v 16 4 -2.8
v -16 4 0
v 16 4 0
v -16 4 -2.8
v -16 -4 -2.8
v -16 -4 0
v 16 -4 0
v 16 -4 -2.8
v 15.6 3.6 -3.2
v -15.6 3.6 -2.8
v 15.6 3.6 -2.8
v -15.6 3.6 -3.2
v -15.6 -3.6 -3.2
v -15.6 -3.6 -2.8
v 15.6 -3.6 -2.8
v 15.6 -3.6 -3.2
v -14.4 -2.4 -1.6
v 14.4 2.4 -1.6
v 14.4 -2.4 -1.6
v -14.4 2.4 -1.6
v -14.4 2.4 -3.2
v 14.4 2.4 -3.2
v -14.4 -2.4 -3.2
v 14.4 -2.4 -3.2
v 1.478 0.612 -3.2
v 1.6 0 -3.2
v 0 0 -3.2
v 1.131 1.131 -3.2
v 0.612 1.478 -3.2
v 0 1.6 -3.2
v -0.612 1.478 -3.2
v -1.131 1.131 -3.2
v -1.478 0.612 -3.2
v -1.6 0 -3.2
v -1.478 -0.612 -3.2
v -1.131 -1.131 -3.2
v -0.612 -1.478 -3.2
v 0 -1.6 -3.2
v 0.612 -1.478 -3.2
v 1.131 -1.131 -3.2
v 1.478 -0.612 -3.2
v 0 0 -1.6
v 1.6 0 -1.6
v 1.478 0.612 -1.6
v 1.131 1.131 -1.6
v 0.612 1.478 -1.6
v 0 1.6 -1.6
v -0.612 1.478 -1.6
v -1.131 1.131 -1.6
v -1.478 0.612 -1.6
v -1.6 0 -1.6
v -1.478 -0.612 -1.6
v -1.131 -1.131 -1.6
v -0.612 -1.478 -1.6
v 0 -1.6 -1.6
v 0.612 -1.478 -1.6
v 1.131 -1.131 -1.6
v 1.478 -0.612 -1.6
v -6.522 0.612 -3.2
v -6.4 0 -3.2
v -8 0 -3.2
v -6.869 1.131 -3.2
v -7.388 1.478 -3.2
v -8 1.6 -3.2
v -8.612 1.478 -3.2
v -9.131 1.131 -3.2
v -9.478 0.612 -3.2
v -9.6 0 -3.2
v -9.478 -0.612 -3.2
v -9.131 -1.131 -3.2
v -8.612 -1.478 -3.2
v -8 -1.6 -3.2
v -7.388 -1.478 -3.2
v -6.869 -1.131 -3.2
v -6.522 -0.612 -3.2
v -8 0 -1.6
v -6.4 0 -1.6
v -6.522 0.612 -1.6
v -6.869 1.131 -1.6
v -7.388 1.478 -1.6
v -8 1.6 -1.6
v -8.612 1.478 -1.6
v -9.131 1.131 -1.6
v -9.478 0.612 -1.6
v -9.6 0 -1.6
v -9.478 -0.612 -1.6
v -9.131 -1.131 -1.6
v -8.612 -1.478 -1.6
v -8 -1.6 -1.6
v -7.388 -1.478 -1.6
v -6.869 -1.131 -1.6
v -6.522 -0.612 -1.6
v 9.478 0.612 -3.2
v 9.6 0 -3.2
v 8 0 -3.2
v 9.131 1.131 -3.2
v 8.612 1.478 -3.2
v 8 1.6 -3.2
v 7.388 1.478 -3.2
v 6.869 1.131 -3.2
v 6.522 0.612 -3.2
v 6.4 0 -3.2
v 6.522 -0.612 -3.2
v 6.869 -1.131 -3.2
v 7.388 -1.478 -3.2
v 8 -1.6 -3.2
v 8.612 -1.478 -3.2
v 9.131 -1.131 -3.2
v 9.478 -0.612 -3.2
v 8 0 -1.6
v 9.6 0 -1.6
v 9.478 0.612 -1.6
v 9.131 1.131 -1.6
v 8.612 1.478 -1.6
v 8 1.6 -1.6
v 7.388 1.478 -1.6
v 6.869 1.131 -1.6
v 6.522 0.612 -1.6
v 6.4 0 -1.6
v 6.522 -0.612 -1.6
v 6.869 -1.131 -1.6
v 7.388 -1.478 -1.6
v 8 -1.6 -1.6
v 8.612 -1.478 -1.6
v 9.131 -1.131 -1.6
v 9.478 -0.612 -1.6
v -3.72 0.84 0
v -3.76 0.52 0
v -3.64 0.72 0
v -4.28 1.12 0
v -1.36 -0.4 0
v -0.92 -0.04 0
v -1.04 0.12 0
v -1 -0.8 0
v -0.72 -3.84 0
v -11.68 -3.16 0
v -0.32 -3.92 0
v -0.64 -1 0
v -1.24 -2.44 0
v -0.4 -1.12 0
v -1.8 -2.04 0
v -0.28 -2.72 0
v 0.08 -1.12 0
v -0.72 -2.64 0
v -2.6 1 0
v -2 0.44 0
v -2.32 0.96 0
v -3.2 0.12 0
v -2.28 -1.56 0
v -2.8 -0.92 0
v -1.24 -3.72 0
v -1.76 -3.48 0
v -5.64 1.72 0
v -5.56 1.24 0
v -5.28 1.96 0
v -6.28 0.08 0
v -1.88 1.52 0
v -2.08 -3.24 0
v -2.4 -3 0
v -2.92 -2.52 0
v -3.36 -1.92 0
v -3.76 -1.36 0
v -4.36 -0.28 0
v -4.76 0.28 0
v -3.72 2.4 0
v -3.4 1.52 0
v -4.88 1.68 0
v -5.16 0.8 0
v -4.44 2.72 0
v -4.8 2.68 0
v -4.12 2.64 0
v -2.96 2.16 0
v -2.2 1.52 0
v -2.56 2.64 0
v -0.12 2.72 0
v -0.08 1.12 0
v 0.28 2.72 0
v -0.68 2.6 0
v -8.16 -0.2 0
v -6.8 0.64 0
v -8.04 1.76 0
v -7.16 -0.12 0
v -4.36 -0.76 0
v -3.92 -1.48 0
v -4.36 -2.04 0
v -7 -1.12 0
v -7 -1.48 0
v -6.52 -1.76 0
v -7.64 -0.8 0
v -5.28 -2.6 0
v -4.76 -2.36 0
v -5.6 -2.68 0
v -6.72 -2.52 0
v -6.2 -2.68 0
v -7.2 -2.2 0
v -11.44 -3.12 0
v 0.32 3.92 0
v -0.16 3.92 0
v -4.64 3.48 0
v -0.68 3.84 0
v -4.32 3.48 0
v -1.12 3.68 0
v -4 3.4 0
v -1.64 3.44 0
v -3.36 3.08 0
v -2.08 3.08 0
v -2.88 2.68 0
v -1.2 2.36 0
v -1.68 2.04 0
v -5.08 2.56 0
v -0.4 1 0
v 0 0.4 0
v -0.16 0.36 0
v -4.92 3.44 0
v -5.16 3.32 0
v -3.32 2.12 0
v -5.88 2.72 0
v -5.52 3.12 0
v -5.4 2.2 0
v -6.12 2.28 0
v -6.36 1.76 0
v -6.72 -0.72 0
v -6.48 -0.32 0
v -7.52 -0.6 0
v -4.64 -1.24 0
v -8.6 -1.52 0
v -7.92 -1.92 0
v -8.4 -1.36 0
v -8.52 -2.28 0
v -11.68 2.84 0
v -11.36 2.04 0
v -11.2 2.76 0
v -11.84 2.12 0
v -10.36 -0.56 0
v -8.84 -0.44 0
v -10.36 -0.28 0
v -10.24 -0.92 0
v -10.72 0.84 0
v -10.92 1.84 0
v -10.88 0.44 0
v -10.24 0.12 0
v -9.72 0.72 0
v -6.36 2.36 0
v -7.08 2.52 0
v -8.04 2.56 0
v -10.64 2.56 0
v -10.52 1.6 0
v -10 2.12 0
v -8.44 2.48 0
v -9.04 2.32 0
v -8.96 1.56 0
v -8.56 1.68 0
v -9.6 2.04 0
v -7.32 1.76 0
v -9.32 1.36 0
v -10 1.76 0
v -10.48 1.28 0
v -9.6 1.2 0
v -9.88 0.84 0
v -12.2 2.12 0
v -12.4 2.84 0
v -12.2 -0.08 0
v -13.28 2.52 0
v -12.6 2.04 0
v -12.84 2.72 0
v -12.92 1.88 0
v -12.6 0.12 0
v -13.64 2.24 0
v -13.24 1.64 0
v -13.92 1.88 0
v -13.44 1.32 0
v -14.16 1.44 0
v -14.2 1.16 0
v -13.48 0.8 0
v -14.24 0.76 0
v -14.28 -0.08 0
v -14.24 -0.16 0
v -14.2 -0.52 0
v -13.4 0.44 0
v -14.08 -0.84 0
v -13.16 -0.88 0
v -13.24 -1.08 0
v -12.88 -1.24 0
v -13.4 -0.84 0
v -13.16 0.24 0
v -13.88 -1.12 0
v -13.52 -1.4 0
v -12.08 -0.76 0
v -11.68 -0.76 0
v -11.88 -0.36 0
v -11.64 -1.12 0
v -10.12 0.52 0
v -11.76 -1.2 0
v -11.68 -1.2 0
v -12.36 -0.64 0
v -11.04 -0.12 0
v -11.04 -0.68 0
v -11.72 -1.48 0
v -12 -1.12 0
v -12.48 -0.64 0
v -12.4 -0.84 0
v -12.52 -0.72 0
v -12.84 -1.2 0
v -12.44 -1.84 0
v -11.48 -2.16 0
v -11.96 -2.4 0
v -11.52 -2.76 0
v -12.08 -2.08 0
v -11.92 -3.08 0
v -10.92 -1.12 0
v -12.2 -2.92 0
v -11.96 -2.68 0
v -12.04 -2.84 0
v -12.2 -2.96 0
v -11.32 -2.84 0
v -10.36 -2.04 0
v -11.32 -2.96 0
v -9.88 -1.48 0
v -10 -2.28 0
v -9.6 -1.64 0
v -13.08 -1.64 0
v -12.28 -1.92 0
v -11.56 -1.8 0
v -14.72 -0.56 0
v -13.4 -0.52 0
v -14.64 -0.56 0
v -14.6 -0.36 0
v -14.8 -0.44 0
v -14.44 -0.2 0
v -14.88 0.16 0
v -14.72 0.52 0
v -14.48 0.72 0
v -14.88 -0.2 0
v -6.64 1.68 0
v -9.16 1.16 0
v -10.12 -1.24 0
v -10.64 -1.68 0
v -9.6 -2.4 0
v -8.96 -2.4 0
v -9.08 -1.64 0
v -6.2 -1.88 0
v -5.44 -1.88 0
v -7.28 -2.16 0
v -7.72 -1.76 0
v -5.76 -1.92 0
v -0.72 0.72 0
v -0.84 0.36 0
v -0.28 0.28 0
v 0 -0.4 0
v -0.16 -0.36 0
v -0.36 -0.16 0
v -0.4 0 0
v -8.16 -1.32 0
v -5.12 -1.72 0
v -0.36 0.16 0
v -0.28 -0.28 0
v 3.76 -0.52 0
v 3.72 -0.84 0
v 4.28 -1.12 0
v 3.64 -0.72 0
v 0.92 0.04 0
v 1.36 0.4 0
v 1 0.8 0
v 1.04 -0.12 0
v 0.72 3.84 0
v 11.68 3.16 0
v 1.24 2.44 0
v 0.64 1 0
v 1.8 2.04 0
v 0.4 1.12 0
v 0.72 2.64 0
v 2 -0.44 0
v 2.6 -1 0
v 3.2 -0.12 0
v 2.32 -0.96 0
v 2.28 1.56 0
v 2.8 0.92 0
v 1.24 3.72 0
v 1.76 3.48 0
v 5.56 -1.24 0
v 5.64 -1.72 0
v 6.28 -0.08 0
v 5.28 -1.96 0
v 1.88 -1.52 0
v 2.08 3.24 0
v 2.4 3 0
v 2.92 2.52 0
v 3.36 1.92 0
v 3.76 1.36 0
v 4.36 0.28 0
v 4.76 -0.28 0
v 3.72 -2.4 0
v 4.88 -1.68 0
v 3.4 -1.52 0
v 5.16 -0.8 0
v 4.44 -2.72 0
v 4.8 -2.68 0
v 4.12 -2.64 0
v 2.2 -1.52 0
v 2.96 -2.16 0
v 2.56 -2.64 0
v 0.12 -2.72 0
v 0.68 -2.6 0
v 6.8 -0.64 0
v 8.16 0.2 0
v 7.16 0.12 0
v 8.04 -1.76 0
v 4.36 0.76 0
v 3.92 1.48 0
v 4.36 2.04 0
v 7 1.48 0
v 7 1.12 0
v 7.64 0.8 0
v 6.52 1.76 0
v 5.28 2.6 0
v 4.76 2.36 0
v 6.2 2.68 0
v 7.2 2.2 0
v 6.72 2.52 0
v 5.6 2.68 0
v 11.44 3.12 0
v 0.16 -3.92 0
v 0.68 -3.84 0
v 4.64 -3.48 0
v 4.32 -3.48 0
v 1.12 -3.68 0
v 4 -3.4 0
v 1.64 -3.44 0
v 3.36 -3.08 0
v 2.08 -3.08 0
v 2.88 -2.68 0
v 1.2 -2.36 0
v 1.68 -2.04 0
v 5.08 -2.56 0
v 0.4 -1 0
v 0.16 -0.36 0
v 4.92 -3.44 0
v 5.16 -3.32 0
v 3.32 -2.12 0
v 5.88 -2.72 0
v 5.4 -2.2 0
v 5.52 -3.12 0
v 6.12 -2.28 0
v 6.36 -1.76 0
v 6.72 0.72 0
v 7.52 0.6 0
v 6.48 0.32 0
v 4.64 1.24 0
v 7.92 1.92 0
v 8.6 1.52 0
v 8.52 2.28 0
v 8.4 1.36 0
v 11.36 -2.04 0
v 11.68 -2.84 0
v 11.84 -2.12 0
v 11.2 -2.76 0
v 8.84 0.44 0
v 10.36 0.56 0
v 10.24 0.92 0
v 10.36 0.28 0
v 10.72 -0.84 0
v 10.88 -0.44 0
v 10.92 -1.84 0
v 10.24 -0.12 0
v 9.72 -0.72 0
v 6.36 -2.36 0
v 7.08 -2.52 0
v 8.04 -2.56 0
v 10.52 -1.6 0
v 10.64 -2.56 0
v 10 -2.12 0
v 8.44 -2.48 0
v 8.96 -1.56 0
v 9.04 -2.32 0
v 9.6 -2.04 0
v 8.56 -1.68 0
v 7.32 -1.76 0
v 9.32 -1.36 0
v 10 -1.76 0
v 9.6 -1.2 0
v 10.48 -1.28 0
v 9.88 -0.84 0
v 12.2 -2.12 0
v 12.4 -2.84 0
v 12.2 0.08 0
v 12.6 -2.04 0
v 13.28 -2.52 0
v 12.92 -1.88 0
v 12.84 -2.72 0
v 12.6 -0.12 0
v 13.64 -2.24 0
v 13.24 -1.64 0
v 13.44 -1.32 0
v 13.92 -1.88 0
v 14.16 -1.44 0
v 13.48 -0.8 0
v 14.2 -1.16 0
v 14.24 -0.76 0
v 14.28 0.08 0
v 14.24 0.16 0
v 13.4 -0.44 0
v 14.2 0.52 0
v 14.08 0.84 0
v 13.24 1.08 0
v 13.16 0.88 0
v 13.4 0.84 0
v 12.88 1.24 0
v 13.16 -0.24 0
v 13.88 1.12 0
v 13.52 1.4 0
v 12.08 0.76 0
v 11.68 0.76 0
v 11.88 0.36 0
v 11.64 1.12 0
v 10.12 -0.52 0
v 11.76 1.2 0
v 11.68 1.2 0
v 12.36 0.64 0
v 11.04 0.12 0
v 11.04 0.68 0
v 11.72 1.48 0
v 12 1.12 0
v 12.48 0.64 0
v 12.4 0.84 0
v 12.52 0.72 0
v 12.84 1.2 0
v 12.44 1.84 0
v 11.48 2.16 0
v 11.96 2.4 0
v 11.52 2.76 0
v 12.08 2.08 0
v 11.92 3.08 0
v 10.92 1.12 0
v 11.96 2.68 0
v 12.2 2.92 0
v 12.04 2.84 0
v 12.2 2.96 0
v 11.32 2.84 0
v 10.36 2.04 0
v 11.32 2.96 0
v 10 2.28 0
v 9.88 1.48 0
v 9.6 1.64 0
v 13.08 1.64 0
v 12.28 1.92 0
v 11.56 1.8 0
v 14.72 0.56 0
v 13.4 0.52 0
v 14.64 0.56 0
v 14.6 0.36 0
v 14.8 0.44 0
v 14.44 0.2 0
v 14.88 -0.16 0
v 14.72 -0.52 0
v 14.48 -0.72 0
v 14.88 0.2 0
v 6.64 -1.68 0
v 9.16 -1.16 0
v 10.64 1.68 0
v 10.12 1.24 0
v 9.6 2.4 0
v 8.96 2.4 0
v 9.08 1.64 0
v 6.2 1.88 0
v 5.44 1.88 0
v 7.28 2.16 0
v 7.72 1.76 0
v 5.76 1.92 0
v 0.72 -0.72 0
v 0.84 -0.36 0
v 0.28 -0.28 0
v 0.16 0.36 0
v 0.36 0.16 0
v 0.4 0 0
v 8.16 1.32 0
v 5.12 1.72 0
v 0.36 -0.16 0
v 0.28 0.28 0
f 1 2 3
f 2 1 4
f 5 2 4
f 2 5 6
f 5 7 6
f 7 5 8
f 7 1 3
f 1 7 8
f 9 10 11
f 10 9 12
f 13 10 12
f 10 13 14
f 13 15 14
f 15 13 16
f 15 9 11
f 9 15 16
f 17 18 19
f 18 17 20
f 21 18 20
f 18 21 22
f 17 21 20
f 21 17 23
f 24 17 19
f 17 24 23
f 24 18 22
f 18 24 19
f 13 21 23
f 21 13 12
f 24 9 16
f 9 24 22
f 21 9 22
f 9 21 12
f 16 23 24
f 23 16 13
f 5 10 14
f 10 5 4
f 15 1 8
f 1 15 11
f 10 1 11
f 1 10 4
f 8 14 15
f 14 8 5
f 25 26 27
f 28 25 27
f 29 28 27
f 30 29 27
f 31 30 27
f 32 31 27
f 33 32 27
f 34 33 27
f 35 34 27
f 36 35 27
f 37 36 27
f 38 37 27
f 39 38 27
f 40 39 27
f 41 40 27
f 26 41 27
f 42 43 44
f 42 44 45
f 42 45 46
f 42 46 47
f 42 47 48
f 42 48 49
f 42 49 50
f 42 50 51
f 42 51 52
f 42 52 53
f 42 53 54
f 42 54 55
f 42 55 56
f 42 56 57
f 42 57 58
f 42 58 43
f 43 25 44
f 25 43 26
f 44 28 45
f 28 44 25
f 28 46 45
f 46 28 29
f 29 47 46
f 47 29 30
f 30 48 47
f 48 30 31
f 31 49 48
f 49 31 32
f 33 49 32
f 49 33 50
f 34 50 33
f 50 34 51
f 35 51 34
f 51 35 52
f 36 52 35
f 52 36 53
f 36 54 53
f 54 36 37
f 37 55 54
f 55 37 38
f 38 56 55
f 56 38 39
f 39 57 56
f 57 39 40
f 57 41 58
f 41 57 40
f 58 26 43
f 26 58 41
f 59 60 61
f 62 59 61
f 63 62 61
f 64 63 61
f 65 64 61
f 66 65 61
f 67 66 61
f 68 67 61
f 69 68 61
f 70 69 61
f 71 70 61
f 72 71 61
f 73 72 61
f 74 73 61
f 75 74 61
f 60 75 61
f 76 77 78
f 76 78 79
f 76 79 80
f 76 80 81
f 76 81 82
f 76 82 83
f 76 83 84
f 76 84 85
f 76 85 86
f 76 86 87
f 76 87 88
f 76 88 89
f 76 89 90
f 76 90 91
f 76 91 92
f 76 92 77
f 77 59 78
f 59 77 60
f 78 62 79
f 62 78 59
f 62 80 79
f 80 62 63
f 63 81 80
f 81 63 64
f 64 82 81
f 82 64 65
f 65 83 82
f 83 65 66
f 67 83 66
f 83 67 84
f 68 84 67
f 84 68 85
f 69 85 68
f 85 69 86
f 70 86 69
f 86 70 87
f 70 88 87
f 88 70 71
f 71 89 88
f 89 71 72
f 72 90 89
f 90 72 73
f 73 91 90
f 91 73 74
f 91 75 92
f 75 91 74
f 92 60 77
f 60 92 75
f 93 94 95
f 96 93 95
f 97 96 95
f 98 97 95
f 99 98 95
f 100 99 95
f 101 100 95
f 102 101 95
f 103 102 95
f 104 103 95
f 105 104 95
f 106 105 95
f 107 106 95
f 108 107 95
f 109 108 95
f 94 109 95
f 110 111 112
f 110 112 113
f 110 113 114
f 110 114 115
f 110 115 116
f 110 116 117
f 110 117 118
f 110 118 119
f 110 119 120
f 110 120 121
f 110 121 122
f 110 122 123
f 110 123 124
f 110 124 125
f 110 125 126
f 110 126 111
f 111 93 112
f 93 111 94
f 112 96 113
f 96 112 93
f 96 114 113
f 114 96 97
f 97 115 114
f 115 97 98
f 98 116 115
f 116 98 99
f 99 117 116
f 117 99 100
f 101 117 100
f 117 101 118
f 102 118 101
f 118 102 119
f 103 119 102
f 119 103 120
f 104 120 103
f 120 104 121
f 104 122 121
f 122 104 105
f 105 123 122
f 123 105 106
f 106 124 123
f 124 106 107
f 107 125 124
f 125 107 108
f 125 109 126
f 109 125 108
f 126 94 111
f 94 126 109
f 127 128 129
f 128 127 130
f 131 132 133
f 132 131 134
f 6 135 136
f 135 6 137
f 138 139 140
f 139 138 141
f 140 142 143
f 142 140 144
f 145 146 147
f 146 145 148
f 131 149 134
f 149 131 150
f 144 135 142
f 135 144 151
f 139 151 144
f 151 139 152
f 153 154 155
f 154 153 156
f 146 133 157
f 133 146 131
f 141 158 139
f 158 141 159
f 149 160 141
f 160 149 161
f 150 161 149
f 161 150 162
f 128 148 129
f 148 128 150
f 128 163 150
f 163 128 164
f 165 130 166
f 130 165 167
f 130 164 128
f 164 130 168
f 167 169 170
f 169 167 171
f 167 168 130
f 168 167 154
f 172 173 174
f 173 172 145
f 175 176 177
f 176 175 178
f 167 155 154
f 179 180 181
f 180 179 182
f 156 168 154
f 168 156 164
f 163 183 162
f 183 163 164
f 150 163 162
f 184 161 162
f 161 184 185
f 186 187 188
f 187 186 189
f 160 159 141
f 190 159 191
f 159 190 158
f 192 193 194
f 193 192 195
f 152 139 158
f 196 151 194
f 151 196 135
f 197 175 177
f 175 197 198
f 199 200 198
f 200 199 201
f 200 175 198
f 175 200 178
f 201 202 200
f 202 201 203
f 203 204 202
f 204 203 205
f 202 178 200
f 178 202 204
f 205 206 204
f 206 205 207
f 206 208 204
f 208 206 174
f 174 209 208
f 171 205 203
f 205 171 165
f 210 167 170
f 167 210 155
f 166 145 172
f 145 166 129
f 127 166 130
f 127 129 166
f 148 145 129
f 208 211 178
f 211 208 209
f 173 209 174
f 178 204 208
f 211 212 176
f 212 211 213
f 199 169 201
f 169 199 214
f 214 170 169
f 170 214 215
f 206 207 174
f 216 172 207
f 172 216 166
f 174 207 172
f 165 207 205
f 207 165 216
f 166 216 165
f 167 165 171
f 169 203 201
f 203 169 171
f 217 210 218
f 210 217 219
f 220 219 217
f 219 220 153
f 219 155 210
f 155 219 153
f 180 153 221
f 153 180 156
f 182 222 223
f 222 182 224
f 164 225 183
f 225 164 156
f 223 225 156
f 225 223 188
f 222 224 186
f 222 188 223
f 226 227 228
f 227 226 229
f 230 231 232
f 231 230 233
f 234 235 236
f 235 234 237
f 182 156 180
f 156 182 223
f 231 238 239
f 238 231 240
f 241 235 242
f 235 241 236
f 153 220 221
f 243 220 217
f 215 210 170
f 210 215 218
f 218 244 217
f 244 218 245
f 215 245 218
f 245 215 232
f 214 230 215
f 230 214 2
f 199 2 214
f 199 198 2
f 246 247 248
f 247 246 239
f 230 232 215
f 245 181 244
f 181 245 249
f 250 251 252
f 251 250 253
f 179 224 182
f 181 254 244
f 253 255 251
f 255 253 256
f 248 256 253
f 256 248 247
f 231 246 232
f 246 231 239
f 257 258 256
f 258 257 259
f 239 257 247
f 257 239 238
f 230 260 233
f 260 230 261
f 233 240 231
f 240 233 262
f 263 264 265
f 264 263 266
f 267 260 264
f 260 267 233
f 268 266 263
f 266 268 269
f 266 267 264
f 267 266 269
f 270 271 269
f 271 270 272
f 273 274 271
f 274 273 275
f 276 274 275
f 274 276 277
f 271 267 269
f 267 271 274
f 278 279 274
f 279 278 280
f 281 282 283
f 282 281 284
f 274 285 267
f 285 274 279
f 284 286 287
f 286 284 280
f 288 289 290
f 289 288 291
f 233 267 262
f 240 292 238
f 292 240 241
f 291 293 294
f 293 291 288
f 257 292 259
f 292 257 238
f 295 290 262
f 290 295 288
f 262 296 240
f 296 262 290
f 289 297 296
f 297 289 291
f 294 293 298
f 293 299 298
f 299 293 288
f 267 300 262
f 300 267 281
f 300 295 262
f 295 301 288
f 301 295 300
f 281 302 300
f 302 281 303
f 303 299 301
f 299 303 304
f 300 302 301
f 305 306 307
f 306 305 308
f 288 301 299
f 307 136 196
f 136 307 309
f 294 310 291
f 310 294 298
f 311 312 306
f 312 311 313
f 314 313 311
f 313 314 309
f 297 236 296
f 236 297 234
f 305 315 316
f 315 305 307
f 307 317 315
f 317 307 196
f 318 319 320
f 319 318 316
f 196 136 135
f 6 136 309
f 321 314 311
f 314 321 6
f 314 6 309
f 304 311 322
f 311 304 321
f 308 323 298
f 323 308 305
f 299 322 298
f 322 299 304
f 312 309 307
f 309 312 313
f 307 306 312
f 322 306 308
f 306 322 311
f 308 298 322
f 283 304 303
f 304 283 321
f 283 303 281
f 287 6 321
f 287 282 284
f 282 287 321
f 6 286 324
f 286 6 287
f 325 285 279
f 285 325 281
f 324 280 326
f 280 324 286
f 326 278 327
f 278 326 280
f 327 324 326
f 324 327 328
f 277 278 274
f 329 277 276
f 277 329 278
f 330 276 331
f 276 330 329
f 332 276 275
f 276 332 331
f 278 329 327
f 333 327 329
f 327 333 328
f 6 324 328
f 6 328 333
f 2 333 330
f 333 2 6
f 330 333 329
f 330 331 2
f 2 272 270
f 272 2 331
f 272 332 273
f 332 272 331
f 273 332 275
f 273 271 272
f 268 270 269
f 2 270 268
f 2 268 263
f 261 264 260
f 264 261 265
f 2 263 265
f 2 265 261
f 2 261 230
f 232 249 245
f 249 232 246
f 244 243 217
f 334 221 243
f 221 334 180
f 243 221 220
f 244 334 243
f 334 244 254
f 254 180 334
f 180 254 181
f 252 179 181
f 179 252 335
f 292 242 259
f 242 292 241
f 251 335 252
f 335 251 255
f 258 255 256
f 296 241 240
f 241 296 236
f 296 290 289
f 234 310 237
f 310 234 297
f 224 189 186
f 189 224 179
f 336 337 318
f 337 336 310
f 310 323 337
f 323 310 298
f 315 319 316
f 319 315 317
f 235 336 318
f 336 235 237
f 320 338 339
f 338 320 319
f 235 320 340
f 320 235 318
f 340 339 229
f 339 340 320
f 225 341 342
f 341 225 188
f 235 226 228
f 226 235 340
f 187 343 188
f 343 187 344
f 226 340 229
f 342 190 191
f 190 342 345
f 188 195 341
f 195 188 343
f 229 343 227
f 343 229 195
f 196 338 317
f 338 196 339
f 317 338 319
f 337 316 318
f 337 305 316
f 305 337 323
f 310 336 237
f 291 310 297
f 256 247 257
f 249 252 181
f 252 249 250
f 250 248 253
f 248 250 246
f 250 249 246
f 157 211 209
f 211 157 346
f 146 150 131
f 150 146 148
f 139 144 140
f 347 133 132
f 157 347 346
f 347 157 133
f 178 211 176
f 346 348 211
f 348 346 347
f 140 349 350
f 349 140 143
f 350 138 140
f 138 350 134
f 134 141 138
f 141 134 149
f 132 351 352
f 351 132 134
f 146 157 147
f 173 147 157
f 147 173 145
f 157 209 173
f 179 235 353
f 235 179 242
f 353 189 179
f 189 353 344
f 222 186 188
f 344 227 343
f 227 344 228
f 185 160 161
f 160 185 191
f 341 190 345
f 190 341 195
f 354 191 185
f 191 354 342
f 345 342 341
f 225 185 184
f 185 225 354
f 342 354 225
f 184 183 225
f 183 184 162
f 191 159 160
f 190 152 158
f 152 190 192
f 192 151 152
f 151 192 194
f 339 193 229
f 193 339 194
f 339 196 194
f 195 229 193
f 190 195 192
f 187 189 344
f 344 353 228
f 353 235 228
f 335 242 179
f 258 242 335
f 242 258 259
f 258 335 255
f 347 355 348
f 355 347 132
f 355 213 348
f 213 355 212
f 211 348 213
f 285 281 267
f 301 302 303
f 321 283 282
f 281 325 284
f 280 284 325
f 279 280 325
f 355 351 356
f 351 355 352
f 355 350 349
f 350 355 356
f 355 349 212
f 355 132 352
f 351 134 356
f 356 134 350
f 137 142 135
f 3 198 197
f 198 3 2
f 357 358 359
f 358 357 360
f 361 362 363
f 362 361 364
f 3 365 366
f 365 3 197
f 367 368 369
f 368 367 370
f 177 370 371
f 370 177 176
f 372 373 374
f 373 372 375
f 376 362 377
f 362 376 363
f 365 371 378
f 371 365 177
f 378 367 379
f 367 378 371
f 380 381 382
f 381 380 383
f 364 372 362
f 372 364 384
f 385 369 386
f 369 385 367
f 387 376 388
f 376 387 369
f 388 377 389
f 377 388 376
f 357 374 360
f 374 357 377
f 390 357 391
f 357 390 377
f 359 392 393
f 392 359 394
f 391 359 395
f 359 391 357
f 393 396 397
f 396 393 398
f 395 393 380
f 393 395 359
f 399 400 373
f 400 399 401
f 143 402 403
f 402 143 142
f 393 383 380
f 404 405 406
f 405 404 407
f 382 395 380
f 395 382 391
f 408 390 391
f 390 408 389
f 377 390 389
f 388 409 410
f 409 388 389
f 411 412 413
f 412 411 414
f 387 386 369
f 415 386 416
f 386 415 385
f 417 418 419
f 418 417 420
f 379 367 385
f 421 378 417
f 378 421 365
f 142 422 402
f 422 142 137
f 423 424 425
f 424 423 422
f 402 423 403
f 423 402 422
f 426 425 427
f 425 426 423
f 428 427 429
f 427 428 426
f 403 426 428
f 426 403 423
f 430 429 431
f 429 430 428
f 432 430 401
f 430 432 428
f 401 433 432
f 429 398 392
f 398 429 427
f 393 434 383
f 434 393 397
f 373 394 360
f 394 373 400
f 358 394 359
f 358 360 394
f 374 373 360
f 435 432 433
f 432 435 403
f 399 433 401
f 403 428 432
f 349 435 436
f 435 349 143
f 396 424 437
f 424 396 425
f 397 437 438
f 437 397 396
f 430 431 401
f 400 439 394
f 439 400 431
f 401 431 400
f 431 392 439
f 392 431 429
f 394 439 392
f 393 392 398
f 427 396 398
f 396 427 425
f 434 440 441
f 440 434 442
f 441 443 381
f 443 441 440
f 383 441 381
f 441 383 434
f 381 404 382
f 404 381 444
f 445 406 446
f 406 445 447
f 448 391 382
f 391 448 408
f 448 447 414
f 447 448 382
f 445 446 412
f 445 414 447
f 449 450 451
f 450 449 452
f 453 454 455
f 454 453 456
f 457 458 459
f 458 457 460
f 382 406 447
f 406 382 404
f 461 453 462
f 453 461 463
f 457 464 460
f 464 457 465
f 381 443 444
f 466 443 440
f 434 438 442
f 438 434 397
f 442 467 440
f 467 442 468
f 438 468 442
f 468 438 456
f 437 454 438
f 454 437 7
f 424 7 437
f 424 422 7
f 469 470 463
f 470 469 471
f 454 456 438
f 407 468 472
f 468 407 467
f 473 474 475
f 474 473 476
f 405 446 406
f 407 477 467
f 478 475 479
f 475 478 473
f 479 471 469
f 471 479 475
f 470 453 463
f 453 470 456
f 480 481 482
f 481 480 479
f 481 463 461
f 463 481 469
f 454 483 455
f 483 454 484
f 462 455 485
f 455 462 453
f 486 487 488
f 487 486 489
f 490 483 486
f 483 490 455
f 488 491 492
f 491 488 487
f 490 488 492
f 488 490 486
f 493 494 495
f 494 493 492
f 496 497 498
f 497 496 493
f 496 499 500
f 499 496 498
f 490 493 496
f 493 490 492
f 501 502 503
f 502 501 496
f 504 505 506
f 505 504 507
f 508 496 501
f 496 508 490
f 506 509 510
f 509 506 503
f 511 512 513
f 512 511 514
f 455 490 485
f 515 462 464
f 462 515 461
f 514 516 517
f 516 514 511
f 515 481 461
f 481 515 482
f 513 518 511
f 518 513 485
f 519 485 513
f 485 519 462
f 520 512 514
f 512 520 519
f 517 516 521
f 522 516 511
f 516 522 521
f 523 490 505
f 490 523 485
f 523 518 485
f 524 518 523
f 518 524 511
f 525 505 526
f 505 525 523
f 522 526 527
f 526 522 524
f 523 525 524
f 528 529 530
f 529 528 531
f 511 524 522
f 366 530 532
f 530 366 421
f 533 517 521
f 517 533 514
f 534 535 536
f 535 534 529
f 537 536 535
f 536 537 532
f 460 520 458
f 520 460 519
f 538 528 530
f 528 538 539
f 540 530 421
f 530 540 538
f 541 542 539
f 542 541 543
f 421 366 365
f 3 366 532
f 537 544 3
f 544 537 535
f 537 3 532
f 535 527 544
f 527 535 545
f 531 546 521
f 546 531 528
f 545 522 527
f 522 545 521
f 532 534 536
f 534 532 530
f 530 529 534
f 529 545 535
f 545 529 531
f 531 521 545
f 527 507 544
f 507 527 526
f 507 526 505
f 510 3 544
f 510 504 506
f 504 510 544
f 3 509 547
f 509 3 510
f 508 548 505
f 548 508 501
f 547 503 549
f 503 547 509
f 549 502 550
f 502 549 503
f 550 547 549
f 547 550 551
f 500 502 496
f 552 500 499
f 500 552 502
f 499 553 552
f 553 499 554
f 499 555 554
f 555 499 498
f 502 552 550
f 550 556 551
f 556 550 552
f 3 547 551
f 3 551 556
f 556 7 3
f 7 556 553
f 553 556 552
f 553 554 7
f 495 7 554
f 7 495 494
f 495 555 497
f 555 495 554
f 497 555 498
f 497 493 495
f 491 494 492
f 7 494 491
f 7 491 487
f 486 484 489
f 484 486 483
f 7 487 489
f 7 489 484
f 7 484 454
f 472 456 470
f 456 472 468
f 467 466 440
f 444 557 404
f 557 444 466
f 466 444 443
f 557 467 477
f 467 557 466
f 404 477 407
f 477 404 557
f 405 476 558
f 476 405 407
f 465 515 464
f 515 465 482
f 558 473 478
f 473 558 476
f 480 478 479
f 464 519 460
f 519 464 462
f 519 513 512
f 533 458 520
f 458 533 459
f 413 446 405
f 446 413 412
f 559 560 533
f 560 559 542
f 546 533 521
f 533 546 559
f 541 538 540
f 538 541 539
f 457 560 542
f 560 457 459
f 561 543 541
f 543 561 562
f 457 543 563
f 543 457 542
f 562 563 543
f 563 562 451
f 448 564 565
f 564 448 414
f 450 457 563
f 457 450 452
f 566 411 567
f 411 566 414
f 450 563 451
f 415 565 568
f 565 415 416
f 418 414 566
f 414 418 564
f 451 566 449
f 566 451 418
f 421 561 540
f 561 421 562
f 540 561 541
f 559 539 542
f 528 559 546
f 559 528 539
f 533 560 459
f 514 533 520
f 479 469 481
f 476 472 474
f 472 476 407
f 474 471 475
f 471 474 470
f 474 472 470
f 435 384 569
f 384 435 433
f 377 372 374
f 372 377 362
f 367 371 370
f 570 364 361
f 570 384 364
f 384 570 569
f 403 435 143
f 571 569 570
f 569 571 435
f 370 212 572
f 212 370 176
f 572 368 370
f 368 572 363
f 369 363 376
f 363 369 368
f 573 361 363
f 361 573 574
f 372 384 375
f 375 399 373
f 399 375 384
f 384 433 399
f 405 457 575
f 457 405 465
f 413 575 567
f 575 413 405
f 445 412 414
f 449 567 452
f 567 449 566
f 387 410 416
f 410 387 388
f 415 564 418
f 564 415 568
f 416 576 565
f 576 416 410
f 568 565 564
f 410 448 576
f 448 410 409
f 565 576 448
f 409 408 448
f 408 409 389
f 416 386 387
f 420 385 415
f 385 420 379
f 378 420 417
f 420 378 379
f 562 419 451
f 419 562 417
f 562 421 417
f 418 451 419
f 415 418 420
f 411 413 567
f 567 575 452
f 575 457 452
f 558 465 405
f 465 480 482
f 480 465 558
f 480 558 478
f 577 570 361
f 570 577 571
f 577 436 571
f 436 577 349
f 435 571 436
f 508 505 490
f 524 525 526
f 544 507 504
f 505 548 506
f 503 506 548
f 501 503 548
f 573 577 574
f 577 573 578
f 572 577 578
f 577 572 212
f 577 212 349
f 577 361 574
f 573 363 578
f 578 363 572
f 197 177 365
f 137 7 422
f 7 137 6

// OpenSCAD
// file: ../p/4-4edge.scad
use <../lib.scad>
function ldraw_lib__4_4edge() = [
// 0 Circle 1.0
// 0 Name: 4-4edge.dat
// 0 Author: James Jessiman
// 0 !LDRAW_ORG Primitive UPDATE 2017-01
// 0 !LICENSE Licensed under CC BY 2.0 and CC BY 4.0 : see CAreadme.txt
// 
// 0 BFC CERTIFY CCW
  [0,"BFC","CERTIFY"],
  [0,"BFC","CCW"],
// 
// 0 !HISTORY 1998-12-15 [PTadmin] Official Update 1998-10
// 0 !HISTORY 2005-12-28 [PTadmin] Official Update 2005-01
// 0 !HISTORY 2007-06-24 [PTadmin] Header formatted for Contributor Agreement
// 0 !HISTORY 2008-07-01 [PTadmin] Official Update 2008-01
// 0 !HISTORY 2017-01-15 [Steffen] BFCed
// 0 !HISTORY 2017-12-30 [PTadmin] Official Update 2017-01
// 
// 
// 2 24 1 0 0 0.9239 0 0.3827
  [2,24,1,0,0,0.9239,0,0.3827],
// 2 24 0.9239 0 0.3827 0.7071 0 0.7071
  [2,24,0.9239,0,0.3827,0.7071,0,0.7071],
// 2 24 0.7071 0 0.7071 0.3827 0 0.9239
  [2,24,0.7071,0,0.7071,0.3827,0,0.9239],
// 2 24 0.3827 0 0.9239 0 0 1
  [2,24,0.3827,0,0.9239,0,0,1],
// 2 24 0 0 1 -0.3827 0 0.9239
  [2,24,0,0,1,-0.3827,0,0.9239],
// 2 24 -0.3827 0 0.9239 -0.7071 0 0.7071
  [2,24,-0.3827,0,0.9239,-0.7071,0,0.7071],
// 2 24 -0.7071 0 0.7071 -0.9239 0 0.3827
  [2,24,-0.7071,0,0.7071,-0.9239,0,0.3827],
// 2 24 -0.9239 0 0.3827 -1 0 -0
  [2,24,-0.9239,0,0.3827,-1,0,-0],
// 2 24 -1 0 -0 -0.9239 0 -0.3827
  [2,24,-1,0,-0,-0.9239,0,-0.3827],
// 2 24 -0.9239 0 -0.3827 -0.7071 0 -0.7071
  [2,24,-0.9239,0,-0.3827,-0.7071,0,-0.7071],
// 2 24 -0.7071 0 -0.7071 -0.3827 0 -0.9239
  [2,24,-0.7071,0,-0.7071,-0.3827,0,-0.9239],
// 2 24 -0.3827 0 -0.9239 0 0 -1
  [2,24,-0.3827,0,-0.9239,0,0,-1],
// 2 24 0 0 -1 0.3827 0 -0.9239
  [2,24,0,0,-1,0.3827,0,-0.9239],
// 2 24 0.3827 0 -0.9239 0.7071 0 -0.7071
  [2,24,0.3827,0,-0.9239,0.7071,0,-0.7071],
// 2 24 0.7071 0 -0.7071 0.9239 0 -0.3827
  [2,24,0.7071,0,-0.7071,0.9239,0,-0.3827],
// 2 24 0.9239 0 -0.3827 1 0 0
  [2,24,0.9239,0,-0.3827,1,0,0],
];
module ldraw_lib__4_4edge(step=0, col=false, unit=2/5, alt=false, line=0.2, solid=!$preview)
    makepoly(ldraw_lib__4_4edge(), step=step, col=col, unit=unit, alt=alt, line=line, solid=solid);
ldraw_lib__4_4edge(line=0.2);
// file: ../p/4-4disc.scad
use <../lib.scad>
function ldraw_lib__4_4disc() = [
// 0 Disc 1.0
// 0 Name: 4-4disc.dat
// 0 Author: James Jessiman
// 0 !LDRAW_ORG Primitive UPDATE 2002-02
// 0 !LICENSE Licensed under CC BY 2.0 and CC BY 4.0 : see CAreadme.txt
// 
// 0 BFC CERTIFY CCW
  [0,"BFC","CERTIFY"],
  [0,"BFC","CCW"],
// 
// 0 !HISTORY 1998-12-15 [PTadmin] Official Update 1998-10
// 0 !HISTORY 2002-03-23 [sbliss] Added BFC statement
// 0 !HISTORY 2002-04-25 [PTadmin] Official Update 2002-02
// 0 !HISTORY 2007-06-24 [PTadmin] Header formatted for Contributor Agreement
// 0 !HISTORY 2008-07-01 [PTadmin] Official Update 2008-01
// 
// 
// 3 16 0 0 0 1 0 0 0.9239 0 0.3827
  [3,16,0,0,0,1,0,0,0.9239,0,0.3827],
// 3 16 0 0 0 0.9239 0 0.3827 0.7071 0 0.7071
  [3,16,0,0,0,0.9239,0,0.3827,0.7071,0,0.7071],
// 3 16 0 0 0 0.7071 0 0.7071 0.3827 0 0.9239
  [3,16,0,0,0,0.7071,0,0.7071,0.3827,0,0.9239],
// 3 16 0 0 0 0.3827 0 0.9239 0 0 1
  [3,16,0,0,0,0.3827,0,0.9239,0,0,1],
// 3 16 0 0 0 0 0 1 -0.3827 0 0.9239
  [3,16,0,0,0,0,0,1,-0.3827,0,0.9239],
// 3 16 0 0 0 -0.3827 0 0.9239 -0.7071 0 0.7071
  [3,16,0,0,0,-0.3827,0,0.9239,-0.7071,0,0.7071],
// 3 16 0 0 0 -0.7071 0 0.7071 -0.9239 0 0.3827
  [3,16,0,0,0,-0.7071,0,0.7071,-0.9239,0,0.3827],
// 3 16 0 0 0 -0.9239 0 0.3827 -1 0 -0
  [3,16,0,0,0,-0.9239,0,0.3827,-1,0,-0],
// 3 16 0 0 0 -1 0 -0 -0.9239 0 -0.3827
  [3,16,0,0,0,-1,0,-0,-0.9239,0,-0.3827],
// 3 16 0 0 0 -0.9239 0 -0.3827 -0.7071 0 -0.7071
  [3,16,0,0,0,-0.9239,0,-0.3827,-0.7071,0,-0.7071],
// 3 16 0 0 0 -0.7071 0 -0.7071 -0.3827 0 -0.9239
  [3,16,0,0,0,-0.7071,0,-0.7071,-0.3827,0,-0.9239],
// 3 16 0 0 0 -0.3827 0 -0.9239 0 0 -1
  [3,16,0,0,0,-0.3827,0,-0.9239,0,0,-1],
// 3 16 0 0 0 0 0 -1 0.3827 0 -0.9239
  [3,16,0,0,0,0,0,-1,0.3827,0,-0.9239],
// 3 16 0 0 0 0.3827 0 -0.9239 0.7071 0 -0.7071
  [3,16,0,0,0,0.3827,0,-0.9239,0.7071,0,-0.7071],
// 3 16 0 0 0 0.7071 0 -0.7071 0.9239 0 -0.3827
  [3,16,0,0,0,0.7071,0,-0.7071,0.9239,0,-0.3827],
// 3 16 0 0 0 0.9239 0 -0.3827 1 0 0
  [3,16,0,0,0,0.9239,0,-0.3827,1,0,0],
// 0
];
module ldraw_lib__4_4disc(step=0, col=false, unit=2/5, alt=false, line=0.2, solid=!$preview)
    makepoly(ldraw_lib__4_4disc(), step=step, col=col, unit=unit, alt=alt, line=line, solid=solid);
ldraw_lib__4_4disc(line=0.2);
// file: ../p/4-4cyli.scad
use <../lib.scad>
$fa=1; $fs=0.2;
function ldraw_lib__4_4cyli(realsolid=false) = [
// 0 Cylinder 1.0
// 0 Name: 4-4cyli.dat
// 0 Author: James Jessiman
// 0 !LDRAW_ORG Primitive UPDATE 2005-01
// 0 !LICENSE Licensed under CC BY 2.0 and CC BY 4.0 : see CAreadme.txt
// 
// 0 BFC CERTIFY CCW
  [0,"BFC","CERTIFY"],
  [0,"BFC","CCW"],
// 
// 0 !HISTORY 1998-12-15 [PTadmin] Official Update 1998-10
// 0 !HISTORY 2002-03-23 [sbliss] Added BFC statement; merged headers from files in distributions LDraw 0.27 and Complete.
// 0 !HISTORY 2002-04-25 [PTadmin] Official Update 2002-02
// 0 !HISTORY 2004-12-14 [guyvivan] BFC CCW
// 0 !HISTORY 2005-12-28 [PTadmin] Official Update 2005-01
// 0 !HISTORY 2007-06-24 [PTadmin] Header formatted for Contributor Agreement
// 0 !HISTORY 2008-07-01 [PTadmin] Official Update 2008-01
// 
// 
// 4 16 1 1 0 0.9239 1 0.3827 0.9239 0 0.3827 1 0 0
  [4,16,1,1,0,0.9239,1,0.3827,0.9239,0,0.3827,1,0,0],
// 5 24 1 0 0 1 1 0 0.9239 0 0.3827 0.9239 0 -0.3827
  [5,24,1,0,0,1,1,0,0.9239,0,0.3827,0.9239,0,-0.3827],
// 4 16 0.9239 1 0.3827 0.7071 1 0.7071 0.7071 0 0.7071 0.9239 0 0.3827
  [4,16,0.9239,1,0.3827,0.7071,1,0.7071,0.7071,0,0.7071,0.9239,0,0.3827],
// 5 24 0.9239 0 0.3827 0.9239 1 0.3827 0.7071 0 0.7071 1 0 0
  [5,24,0.9239,0,0.3827,0.9239,1,0.3827,0.7071,0,0.7071,1,0,0],
// 4 16 0.7071 1 0.7071 0.3827 1 0.9239 0.3827 0 0.9239 0.7071 0 0.7071
  [4,16,0.7071,1,0.7071,0.3827,1,0.9239,0.3827,0,0.9239,0.7071,0,0.7071],
// 5 24 0.7071 0 0.7071 0.7071 1 0.7071 0.3827 0 0.9239 0.9239 0 0.3827
  [5,24,0.7071,0,0.7071,0.7071,1,0.7071,0.3827,0,0.9239,0.9239,0,0.3827],
// 4 16 0.3827 1 0.9239 0 1 1 0 0 1 0.3827 0 0.9239
  [4,16,0.3827,1,0.9239,0,1,1,0,0,1,0.3827,0,0.9239],
// 5 24 0.3827 0 0.9239 0.3827 1 0.9239 0 0 1 0.7071 0 0.7071
  [5,24,0.3827,0,0.9239,0.3827,1,0.9239,0,0,1,0.7071,0,0.7071],
// 4 16 0 1 1 -0.3827 1 0.9239 -0.3827 0 0.9239 0 0 1
  [4,16,0,1,1,-0.3827,1,0.9239,-0.3827,0,0.9239,0,0,1],
// 5 24 0 0 1 0 1 1 -0.3827 0 0.9239 0.3827 0 0.9239
  [5,24,0,0,1,0,1,1,-0.3827,0,0.9239,0.3827,0,0.9239],
// 4 16 -0.3827 1 0.9239 -0.7071 1 0.7071 -0.7071 0 0.7071 -0.3827 0 0.9239
  [4,16,-0.3827,1,0.9239,-0.7071,1,0.7071,-0.7071,0,0.7071,-0.3827,0,0.9239],
// 5 24 -0.3827 0 0.9239 -0.3827 1 0.9239 -0.7071 0 0.7071 0 0 1
  [5,24,-0.3827,0,0.9239,-0.3827,1,0.9239,-0.7071,0,0.7071,0,0,1],
// 4 16 -0.7071 1 0.7071 -0.9239 1 0.3827 -0.9239 0 0.3827 -0.7071 0 0.7071
  [4,16,-0.7071,1,0.7071,-0.9239,1,0.3827,-0.9239,0,0.3827,-0.7071,0,0.7071],
// 5 24 -0.7071 0 0.7071 -0.7071 1 0.7071 -0.9239 0 0.3827 -0.3827 0 0.9239
  [5,24,-0.7071,0,0.7071,-0.7071,1,0.7071,-0.9239,0,0.3827,-0.3827,0,0.9239],
// 4 16 -0.9239 1 0.3827 -1 1 0 -1 0 0 -0.9239 0 0.3827
  [4,16,-0.9239,1,0.3827,-1,1,0,-1,0,0,-0.9239,0,0.3827],
// 5 24 -0.9239 0 0.3827 -0.9239 1 0.3827 -1 0 0 -0.7071 0 0.7071
  [5,24,-0.9239,0,0.3827,-0.9239,1,0.3827,-1,0,0,-0.7071,0,0.7071],
// 4 16 -1 1 0 -0.9239 1 -0.3827 -0.9239 0 -0.3827 -1 0 0
  [4,16,-1,1,0,-0.9239,1,-0.3827,-0.9239,0,-0.3827,-1,0,0],
// 5 24 -1 0 0 -1 1 0 -0.9239 0 -0.3827 -0.9239 0 0.3827
  [5,24,-1,0,0,-1,1,0,-0.9239,0,-0.3827,-0.9239,0,0.3827],
// 4 16 -0.9239 1 -0.3827 -0.7071 1 -0.7071 -0.7071 0 -0.7071 -0.9239 0 -0.3827
  [4,16,-0.9239,1,-0.3827,-0.7071,1,-0.7071,-0.7071,0,-0.7071,-0.9239,0,-0.3827],
// 5 24 -0.9239 0 -0.3827 -0.9239 1 -0.3827 -0.7071 0 -0.7071 -1 0 0
  [5,24,-0.9239,0,-0.3827,-0.9239,1,-0.3827,-0.7071,0,-0.7071,-1,0,0],
// 4 16 -0.7071 1 -0.7071 -0.3827 1 -0.9239 -0.3827 0 -0.9239 -0.7071 0 -0.7071
  [4,16,-0.7071,1,-0.7071,-0.3827,1,-0.9239,-0.3827,0,-0.9239,-0.7071,0,-0.7071],
// 5 24 -0.7071 0 -0.7071 -0.7071 1 -0.7071 -0.3827 0 -0.9239 -0.9239 0 -0.3827
  [5,24,-0.7071,0,-0.7071,-0.7071,1,-0.7071,-0.3827,0,-0.9239,-0.9239,0,-0.3827],
// 4 16 -0.3827 1 -0.9239 0 1 -1 0 0 -1 -0.3827 0 -0.9239
  [4,16,-0.3827,1,-0.9239,0,1,-1,0,0,-1,-0.3827,0,-0.9239],
// 5 24 -0.3827 0 -0.9239 -0.3827 1 -0.9239 0 0 -1 -0.7071 0 -0.7071
  [5,24,-0.3827,0,-0.9239,-0.3827,1,-0.9239,0,0,-1,-0.7071,0,-0.7071],
// 4 16 0 1 -1 0.3827 1 -0.9239 0.3827 0 -0.9239 0 0 -1
  [4,16,0,1,-1,0.3827,1,-0.9239,0.3827,0,-0.9239,0,0,-1],
// 5 24 0 0 -1 0 1 -1 0.3827 0 -0.9239 -0.3827 0 -0.9239
  [5,24,0,0,-1,0,1,-1,0.3827,0,-0.9239,-0.3827,0,-0.9239],
// 4 16 0.3827 1 -0.9239 0.7071 1 -0.7071 0.7071 0 -0.7071 0.3827 0 -0.9239
  [4,16,0.3827,1,-0.9239,0.7071,1,-0.7071,0.7071,0,-0.7071,0.3827,0,-0.9239],
// 5 24 0.3827 0 -0.9239 0.3827 1 -0.9239 0.7071 0 -0.7071 0 0 -1
  [5,24,0.3827,0,-0.9239,0.3827,1,-0.9239,0.7071,0,-0.7071,0,0,-1],
// 4 16 0.7071 1 -0.7071 0.9239 1 -0.3827 0.9239 0 -0.3827 0.7071 0 -0.7071
  [4,16,0.7071,1,-0.7071,0.9239,1,-0.3827,0.9239,0,-0.3827,0.7071,0,-0.7071],
// 5 24 0.7071 0 -0.7071 0.7071 1 -0.7071 0.9239 0 -0.3827 0.3827 0 -0.9239
  [5,24,0.7071,0,-0.7071,0.7071,1,-0.7071,0.9239,0,-0.3827,0.3827,0,-0.9239],
// 4 16 0.9239 1 -0.3827 1 1 0 1 0 0 0.9239 0 -0.3827
  [4,16,0.9239,1,-0.3827,1,1,0,1,0,0,0.9239,0,-0.3827],
// 5 24 0.9239 0 -0.3827 0.9239 1 -0.3827 1 0 0 0.7071 0 -0.7071
  [5,24,0.9239,0,-0.3827,0.9239,1,-0.3827,1,0,0,0.7071,0,-0.7071],
// 0
];
module ldraw_lib__4_4cyli(step=0, col=false, unit=2/5, alt=false, line=0.2, solid=!$preview)
    makepoly(ldraw_lib__4_4cyli(solid), step=step, col=col, unit=unit, alt=alt, line=line, solid=solid);
ldraw_lib__4_4cyli(line=0.2);
// file: ../p/stud3.scad
use <../lib.scad>
use <4-4cyli.scad>
use <4-4disc.scad>
use <4-4edge.scad>
function ldraw_lib__stud3() = [
// 0 Stud Tube Solid
// 0 Name: stud3.dat
// 0 Author: James Jessiman
// 0 !LDRAW_ORG Primitive UPDATE 2012-01
// 0 !LICENSE Licensed under CC BY 4.0 : see CAreadme.txt
// 
// 0 BFC CERTIFY CCW
  [0,"BFC","CERTIFY"],
  [0,"BFC","CCW"],
// 
// 0 !HISTORY 2002-04-04 [sbliss] Modified for BFC compliance
// 0 !HISTORY 2002-04-25 [PTadmin] Official Update 2002-02
// 0 !HISTORY 2007-06-24 [PTadmin] Header formatted for Contributor Agreement
// 0 !HISTORY 2008-07-01 [PTadmin] Official Update 2008-01
// 0 !HISTORY 2012-02-16 [Philo] Changed to CCW
// 0 !HISTORY 2012-03-30 [PTadmin] Official Update 2012-01
// 
// 
// 1 16 0 -4 0 4 0 0 0 1 0 0 0 4 4-4edge.dat
  [1,16,0,-4,0,4,0,0,0,1,0,0,0,4, ldraw_lib__4_4edge()],
// 1 16 0 0 0 4 0 0 0 1 0 0 0 4 4-4edge.dat
  [1,16,0,0,0,4,0,0,0,1,0,0,0,4, ldraw_lib__4_4edge()],
// 1 16 0 -4 0 4 0 0 0 1 0 0 0 4 4-4disc.dat
  [1,16,0,-4,0,4,0,0,0,1,0,0,0,4, ldraw_lib__4_4disc()],
  [-1,16,0,0,0,4,0,0,0,-1,0,0,0,4, ldraw_lib__4_4disc()],
// 1 16 0 -4 0 4 0 0 0 4 0 0 0 4 4-4cyli.dat
  [1,16,0,-4,0,4,0,0,0,4,0,0,0,4, ldraw_lib__4_4cyli()],
];
module ldraw_lib__stud3(step=0, col=false, unit=2/5, alt=false, line=0.2, solid=!$preview)
    makepoly(ldraw_lib__stud3(), step=step, col=col, unit=unit, alt=alt, line=line, solid=solid);
ldraw_lib__stud3(line=0.2);
// file: ../p/box5.scad
use <../lib.scad>
function ldraw_lib__box5() = [
// 0 Box with 5 Faces and All Edges
// 0 Name: box5.dat
// 0 Author: James Jessiman
// 0 !LDRAW_ORG Primitive UPDATE 2012-01
// 0 !LICENSE Licensed under CC BY 2.0 and CC BY 4.0 : see CAreadme.txt
// 
// 0 BFC CERTIFY CCW
  [0,"BFC","CERTIFY"],
  [0,"BFC","CCW"],
// 
// 0 !HISTORY 2002-04-03 [sbliss] Modified for BFC compliance
// 0 !HISTORY 2002-04-25 [PTadmin] Official Update 2002-02
// 0 !HISTORY 2007-06-24 [PTadmin] Header formatted for Contributor Agreement
// 0 !HISTORY 2008-07-01 [PTadmin] Official Update 2008-01
// 0 !HISTORY 2012-02-16 [Philo] Changed to CCW
// 0 !HISTORY 2012-03-30 [PTadmin] Official Update 2012-01
// 
// 
// 2 24 1 1 1 -1 1 1
  [2,24,1,1,1,-1,1,1],
// 2 24 -1 1 1 -1 1 -1
  [2,24,-1,1,1,-1,1,-1],
// 2 24 -1 1 -1 1 1 -1
  [2,24,-1,1,-1,1,1,-1],
// 2 24 1 1 -1 1 1 1
  [2,24,1,1,-1,1,1,1],
// 2 24 1 0 1 -1 0 1
  [2,24,1,0,1,-1,0,1],
// 2 24 -1 0 1 -1 0 -1
  [2,24,-1,0,1,-1,0,-1],
// 2 24 -1 0 -1 1 0 -1
  [2,24,-1,0,-1,1,0,-1],
// 2 24 1 0 -1 1 0 1
  [2,24,1,0,-1,1,0,1],
// 2 24 1 0 1 1 1 1
  [2,24,1,0,1,1,1,1],
// 2 24 -1 0 1 -1 1 1
  [2,24,-1,0,1,-1,1,1],
// 2 24 1 0 -1 1 1 -1
  [2,24,1,0,-1,1,1,-1],
// 2 24 -1 0 -1 -1 1 -1
  [2,24,-1,0,-1,-1,1,-1],
// 4 16 -1 1 1 1 1 1 1 1 -1 -1 1 -1
  [4,16,-1,1,1,1,1,1,1,1,-1,-1,1,-1],
// 4 16 -1 1 1 -1 0 1 1 0 1 1 1 1
  [4,16,-1,1,1,-1,0,1,1,0,1,1,1,1],
// 4 16 -1 1 -1 -1 0 -1 -1 0 1 -1 1 1
  [4,16,-1,1,-1,-1,0,-1,-1,0,1,-1,1,1],
// 4 16 1 1 -1 1 0 -1 -1 0 -1 -1 1 -1
  [4,16,1,1,-1,1,0,-1,-1,0,-1,-1,1,-1],
// 4 16 1 1 1 1 0 1 1 0 -1 1 1 -1
  [4,16,1,1,1,1,0,1,1,0,-1,1,1,-1],
];
makepoly(ldraw_lib__box5(), line=0.2);
// file: ../p/box4.scad
use <../lib.scad>
function ldraw_lib__box4() = [
// 0 Box with 4 Faces (2 Parallel Pairs) and All Edges
// 0 Name: box4.dat
// 0 Author: James Jessiman
// 0 !LDRAW_ORG Primitive UPDATE 2012-01
// 0 !LICENSE Licensed under CC BY 4.0 : see CAreadme.txt
// 
// 0 BFC CERTIFY CCW
  [0,"BFC","CERTIFY"],
  [0,"BFC","CCW"],
// 
// 0 !HISTORY 2002-04-03 [sbliss] Modified for BFC compliance
// 0 !HISTORY 2002-04-25 [PTadmin] Official Update 2002-02
// 0 !HISTORY 2007-06-24 [PTadmin] Header formatted for Contributor Agreement
// 0 !HISTORY 2008-07-01 [PTadmin] Official Update 2008-01
// 0 !HISTORY 2012-02-16 [Philo] Changed to CCW
// 0 !HISTORY 2012-03-30 [PTadmin] Official Update 2012-01
// 
// 
// 2 24 1 1 1 -1 1 1
  [2,24,1,1,1,-1,1,1],
// 2 24 -1 1 1 -1 1 -1
  [2,24,-1,1,1,-1,1,-1],
// 2 24 -1 1 -1 1 1 -1
  [2,24,-1,1,-1,1,1,-1],
// 2 24 1 1 -1 1 1 1
  [2,24,1,1,-1,1,1,1],
// 2 24 1 0 1 -1 0 1
  [2,24,1,0,1,-1,0,1],
// 2 24 -1 0 1 -1 0 -1
  [2,24,-1,0,1,-1,0,-1],
// 2 24 -1 0 -1 1 0 -1
  [2,24,-1,0,-1,1,0,-1],
// 2 24 1 0 -1 1 0 1
  [2,24,1,0,-1,1,0,1],
// 2 24 1 0 1 1 1 1
  [2,24,1,0,1,1,1,1],
// 2 24 -1 0 1 -1 1 1
  [2,24,-1,0,1,-1,1,1],
// 2 24 1 0 -1 1 1 -1
  [2,24,1,0,-1,1,1,-1],
// 2 24 -1 0 -1 -1 1 -1
  [2,24,-1,0,-1,-1,1,-1],
// 4 16 -1 1 1 -1 0 1 1 0 1 1 1 1
  [4,16,-1,1,1,-1,0,1,1,0,1,1,1,1],
// 4 16 -1 1 -1 -1 0 -1 -1 0 1 -1 1 1
  [4,16,-1,1,-1,-1,0,-1,-1,0,1,-1,1,1],
// 4 16 1 1 -1 1 0 -1 -1 0 -1 -1 1 -1
  [4,16,1,1,-1,1,0,-1,-1,0,-1,-1,1,-1],
// 4 16 1 1 1 1 0 1 1 0 -1 1 1 -1
  [4,16,1,1,1,1,0,1,1,0,-1,1,1,-1],
];
module ldraw_lib__box4(step=0, col=false, unit=2/5, alt=false, line=0.2, solid=!$preview)
    makepoly(ldraw_lib__box4(), step=step, col=col, unit=unit, alt=alt, line=line, solid=solid);
ldraw_lib__box4(line=0.2);
// file: s/2431s01.scad
use <../../lib.scad>
use <../../p/box4.scad>
use <../../p/box5.scad>
use <../../p/stud3.scad>
function ldraw_lib__s__2431s01() = [
// 0 ~Tile  1 x  4 with Groove without Top Face
// 0 Name: s\2431s01.dat
// 0 Author: Santeri Piippo [arezey]
// 0 !LDRAW_ORG Subpart UPDATE 2010-02
// 0 !LICENSE Licensed under CC BY 2.0 and CC BY 4.0 : see CAreadme.txt
// 
// 0 BFC CERTIFY CCW
  [0,"BFC","CERTIFY"],
  [0,"BFC","CCW"],
// 
// 0 !HISTORY 2010-07-05 [PTadmin] Official Update 2010-02
// 
// 
// 1 16 0 0 0 40 0 0 0 7 0 0 0 10 box4.dat
  [1,16,0,0,0,40,0,0,0,7,0,0,0,10, ldraw_lib__box4()],
// 1 16 0 7 0 39 0 0 0 1 0 0 0 9 box4.dat
  [1,16,0,7,0,39,0,0,0,1,0,0,0,9, ldraw_lib__box4()],
// 0 BFC INVERTNEXT
  [0,"BFC","INVERTNEXT"],
// 1 16 0 8 0 36 0 0 0 -4 0 0 0 6 box5.dat
  [1,16,0,8,0,36,0,0,0,-4,0,0,0,6, ldraw_lib__box5()],
// 4 16 -39 8 9 -36 8 6 -36 8 -6 -39 8 -9
  [4,16,-39,8,9,-36,8,6,-36,8,-6,-39,8,-9],
// 4 16 39 8 -9 36 8 -6 36 8 6 39 8 9
  [4,16,39,8,-9,36,8,-6,36,8,6,39,8,9],
// 4 16 39 8 9 36 8 6 -36 8 6 -39 8 9
  [4,16,39,8,9,36,8,6,-36,8,6,-39,8,9],
// 4 16 -39 8 -9 -36 8 -6 36 8 -6 39 8 -9
  [4,16,-39,8,-9,-36,8,-6,36,8,-6,39,8,-9],
// 4 16 -40 7 10 -39 7 9 -39 7 -9 -40 7 -10
  [4,16,-40,7,10,-39,7,9,-39,7,-9,-40,7,-10],
// 4 16 40 7 -10 39 7 -9 39 7 9 40 7 10
  [4,16,40,7,-10,39,7,-9,39,7,9,40,7,10],
// 4 16 40 7 10 39 7 9 -39 7 9 -40 7 10
  [4,16,40,7,10,39,7,9,-39,7,9,-40,7,10],
// 4 16 -40 7 -10 -39 7 -9 39 7 -9 40 7 -10
  [4,16,-40,7,-10,-39,7,-9,39,7,-9,40,7,-10],
// 1 16 0 4 0 1 0 0 0 -1 0 0 0 1 stud3.dat
  [1,16,0,4,0,1,0,0,0,-1,0,0,0,1, ldraw_lib__stud3()],
// 1 16 -20 4 0 1 0 0 0 -1 0 0 0 1 stud3.dat
  [1,16,-20,4,0,1,0,0,0,-1,0,0,0,1, ldraw_lib__stud3()],
// 1 16 20 4 0 1 0 0 0 -1 0 0 0 1 stud3.dat
  [1,16,20,4,0,1,0,0,0,-1,0,0,0,1, ldraw_lib__stud3()],
// 0 //
];
makepoly(ldraw_lib__s__2431s01(), line=0.2);
// main file
use <../lib.scad>
use <s/2431p28s01.scad>
use <s/2431s01.scad>
function ldraw_lib__2431p28() = [
// 0 Tile  1 x  4 with Metallic Gold Coiling Snakes Pattern
// 0 Name: 2431p28.dat
// 0 Author: Philippe Hurbain [Philo]
// 0 !LDRAW_ORG Part UPDATE 2024-06
// 0 !LICENSE Licensed under CC BY 4.0 : see CAreadme.txt
// 
// 0 BFC CERTIFY CCW
  [0,"BFC","CERTIFY"],
  [0,"BFC","CCW"],
// 
// 0 !KEYWORDS Bricklink 2431pb848, Entwined, Intertwined, Rebrickable 2431pr9993
// 0 !KEYWORDS Sea Serpent, Set 21343, Viking Village
// 
// 0 !HISTORY 2024-07-29 [OrionP] Official Update 2024-06
// 
// 1 16 0 0 0 1 0 0 0 1 0 0 0 1 s\2431s01.dat
  [1,16,0,0,0,1,0,0,0,1,0,0,0,1, ldraw_lib__s__2431s01()],
// 1 16 0 0 0 1 0 0 0 1 0 0 0 1 s\2431p28s01.dat
  [1,16,0,0,0,1,0,0,0,1,0,0,0,1, ldraw_lib__s__2431p28s01()],
// 1 16 0 0 0 -1 0 0 0 1 0 0 0 -1 s\2431p28s01.dat
  [1,16,0,0,0,-1,0,0,0,1,0,0,0,-1, ldraw_lib__s__2431p28s01()],
];
module ldraw_lib__2431p28(step=0, col=false, unit=2/5, alt=false, line=0.2, solid=!$preview)
    makepoly(ldraw_lib__2431p28(), step=step, col=col, unit=unit, alt=alt, line=line, solid=solid);
ldraw_lib__2431p28(line=0.2);
